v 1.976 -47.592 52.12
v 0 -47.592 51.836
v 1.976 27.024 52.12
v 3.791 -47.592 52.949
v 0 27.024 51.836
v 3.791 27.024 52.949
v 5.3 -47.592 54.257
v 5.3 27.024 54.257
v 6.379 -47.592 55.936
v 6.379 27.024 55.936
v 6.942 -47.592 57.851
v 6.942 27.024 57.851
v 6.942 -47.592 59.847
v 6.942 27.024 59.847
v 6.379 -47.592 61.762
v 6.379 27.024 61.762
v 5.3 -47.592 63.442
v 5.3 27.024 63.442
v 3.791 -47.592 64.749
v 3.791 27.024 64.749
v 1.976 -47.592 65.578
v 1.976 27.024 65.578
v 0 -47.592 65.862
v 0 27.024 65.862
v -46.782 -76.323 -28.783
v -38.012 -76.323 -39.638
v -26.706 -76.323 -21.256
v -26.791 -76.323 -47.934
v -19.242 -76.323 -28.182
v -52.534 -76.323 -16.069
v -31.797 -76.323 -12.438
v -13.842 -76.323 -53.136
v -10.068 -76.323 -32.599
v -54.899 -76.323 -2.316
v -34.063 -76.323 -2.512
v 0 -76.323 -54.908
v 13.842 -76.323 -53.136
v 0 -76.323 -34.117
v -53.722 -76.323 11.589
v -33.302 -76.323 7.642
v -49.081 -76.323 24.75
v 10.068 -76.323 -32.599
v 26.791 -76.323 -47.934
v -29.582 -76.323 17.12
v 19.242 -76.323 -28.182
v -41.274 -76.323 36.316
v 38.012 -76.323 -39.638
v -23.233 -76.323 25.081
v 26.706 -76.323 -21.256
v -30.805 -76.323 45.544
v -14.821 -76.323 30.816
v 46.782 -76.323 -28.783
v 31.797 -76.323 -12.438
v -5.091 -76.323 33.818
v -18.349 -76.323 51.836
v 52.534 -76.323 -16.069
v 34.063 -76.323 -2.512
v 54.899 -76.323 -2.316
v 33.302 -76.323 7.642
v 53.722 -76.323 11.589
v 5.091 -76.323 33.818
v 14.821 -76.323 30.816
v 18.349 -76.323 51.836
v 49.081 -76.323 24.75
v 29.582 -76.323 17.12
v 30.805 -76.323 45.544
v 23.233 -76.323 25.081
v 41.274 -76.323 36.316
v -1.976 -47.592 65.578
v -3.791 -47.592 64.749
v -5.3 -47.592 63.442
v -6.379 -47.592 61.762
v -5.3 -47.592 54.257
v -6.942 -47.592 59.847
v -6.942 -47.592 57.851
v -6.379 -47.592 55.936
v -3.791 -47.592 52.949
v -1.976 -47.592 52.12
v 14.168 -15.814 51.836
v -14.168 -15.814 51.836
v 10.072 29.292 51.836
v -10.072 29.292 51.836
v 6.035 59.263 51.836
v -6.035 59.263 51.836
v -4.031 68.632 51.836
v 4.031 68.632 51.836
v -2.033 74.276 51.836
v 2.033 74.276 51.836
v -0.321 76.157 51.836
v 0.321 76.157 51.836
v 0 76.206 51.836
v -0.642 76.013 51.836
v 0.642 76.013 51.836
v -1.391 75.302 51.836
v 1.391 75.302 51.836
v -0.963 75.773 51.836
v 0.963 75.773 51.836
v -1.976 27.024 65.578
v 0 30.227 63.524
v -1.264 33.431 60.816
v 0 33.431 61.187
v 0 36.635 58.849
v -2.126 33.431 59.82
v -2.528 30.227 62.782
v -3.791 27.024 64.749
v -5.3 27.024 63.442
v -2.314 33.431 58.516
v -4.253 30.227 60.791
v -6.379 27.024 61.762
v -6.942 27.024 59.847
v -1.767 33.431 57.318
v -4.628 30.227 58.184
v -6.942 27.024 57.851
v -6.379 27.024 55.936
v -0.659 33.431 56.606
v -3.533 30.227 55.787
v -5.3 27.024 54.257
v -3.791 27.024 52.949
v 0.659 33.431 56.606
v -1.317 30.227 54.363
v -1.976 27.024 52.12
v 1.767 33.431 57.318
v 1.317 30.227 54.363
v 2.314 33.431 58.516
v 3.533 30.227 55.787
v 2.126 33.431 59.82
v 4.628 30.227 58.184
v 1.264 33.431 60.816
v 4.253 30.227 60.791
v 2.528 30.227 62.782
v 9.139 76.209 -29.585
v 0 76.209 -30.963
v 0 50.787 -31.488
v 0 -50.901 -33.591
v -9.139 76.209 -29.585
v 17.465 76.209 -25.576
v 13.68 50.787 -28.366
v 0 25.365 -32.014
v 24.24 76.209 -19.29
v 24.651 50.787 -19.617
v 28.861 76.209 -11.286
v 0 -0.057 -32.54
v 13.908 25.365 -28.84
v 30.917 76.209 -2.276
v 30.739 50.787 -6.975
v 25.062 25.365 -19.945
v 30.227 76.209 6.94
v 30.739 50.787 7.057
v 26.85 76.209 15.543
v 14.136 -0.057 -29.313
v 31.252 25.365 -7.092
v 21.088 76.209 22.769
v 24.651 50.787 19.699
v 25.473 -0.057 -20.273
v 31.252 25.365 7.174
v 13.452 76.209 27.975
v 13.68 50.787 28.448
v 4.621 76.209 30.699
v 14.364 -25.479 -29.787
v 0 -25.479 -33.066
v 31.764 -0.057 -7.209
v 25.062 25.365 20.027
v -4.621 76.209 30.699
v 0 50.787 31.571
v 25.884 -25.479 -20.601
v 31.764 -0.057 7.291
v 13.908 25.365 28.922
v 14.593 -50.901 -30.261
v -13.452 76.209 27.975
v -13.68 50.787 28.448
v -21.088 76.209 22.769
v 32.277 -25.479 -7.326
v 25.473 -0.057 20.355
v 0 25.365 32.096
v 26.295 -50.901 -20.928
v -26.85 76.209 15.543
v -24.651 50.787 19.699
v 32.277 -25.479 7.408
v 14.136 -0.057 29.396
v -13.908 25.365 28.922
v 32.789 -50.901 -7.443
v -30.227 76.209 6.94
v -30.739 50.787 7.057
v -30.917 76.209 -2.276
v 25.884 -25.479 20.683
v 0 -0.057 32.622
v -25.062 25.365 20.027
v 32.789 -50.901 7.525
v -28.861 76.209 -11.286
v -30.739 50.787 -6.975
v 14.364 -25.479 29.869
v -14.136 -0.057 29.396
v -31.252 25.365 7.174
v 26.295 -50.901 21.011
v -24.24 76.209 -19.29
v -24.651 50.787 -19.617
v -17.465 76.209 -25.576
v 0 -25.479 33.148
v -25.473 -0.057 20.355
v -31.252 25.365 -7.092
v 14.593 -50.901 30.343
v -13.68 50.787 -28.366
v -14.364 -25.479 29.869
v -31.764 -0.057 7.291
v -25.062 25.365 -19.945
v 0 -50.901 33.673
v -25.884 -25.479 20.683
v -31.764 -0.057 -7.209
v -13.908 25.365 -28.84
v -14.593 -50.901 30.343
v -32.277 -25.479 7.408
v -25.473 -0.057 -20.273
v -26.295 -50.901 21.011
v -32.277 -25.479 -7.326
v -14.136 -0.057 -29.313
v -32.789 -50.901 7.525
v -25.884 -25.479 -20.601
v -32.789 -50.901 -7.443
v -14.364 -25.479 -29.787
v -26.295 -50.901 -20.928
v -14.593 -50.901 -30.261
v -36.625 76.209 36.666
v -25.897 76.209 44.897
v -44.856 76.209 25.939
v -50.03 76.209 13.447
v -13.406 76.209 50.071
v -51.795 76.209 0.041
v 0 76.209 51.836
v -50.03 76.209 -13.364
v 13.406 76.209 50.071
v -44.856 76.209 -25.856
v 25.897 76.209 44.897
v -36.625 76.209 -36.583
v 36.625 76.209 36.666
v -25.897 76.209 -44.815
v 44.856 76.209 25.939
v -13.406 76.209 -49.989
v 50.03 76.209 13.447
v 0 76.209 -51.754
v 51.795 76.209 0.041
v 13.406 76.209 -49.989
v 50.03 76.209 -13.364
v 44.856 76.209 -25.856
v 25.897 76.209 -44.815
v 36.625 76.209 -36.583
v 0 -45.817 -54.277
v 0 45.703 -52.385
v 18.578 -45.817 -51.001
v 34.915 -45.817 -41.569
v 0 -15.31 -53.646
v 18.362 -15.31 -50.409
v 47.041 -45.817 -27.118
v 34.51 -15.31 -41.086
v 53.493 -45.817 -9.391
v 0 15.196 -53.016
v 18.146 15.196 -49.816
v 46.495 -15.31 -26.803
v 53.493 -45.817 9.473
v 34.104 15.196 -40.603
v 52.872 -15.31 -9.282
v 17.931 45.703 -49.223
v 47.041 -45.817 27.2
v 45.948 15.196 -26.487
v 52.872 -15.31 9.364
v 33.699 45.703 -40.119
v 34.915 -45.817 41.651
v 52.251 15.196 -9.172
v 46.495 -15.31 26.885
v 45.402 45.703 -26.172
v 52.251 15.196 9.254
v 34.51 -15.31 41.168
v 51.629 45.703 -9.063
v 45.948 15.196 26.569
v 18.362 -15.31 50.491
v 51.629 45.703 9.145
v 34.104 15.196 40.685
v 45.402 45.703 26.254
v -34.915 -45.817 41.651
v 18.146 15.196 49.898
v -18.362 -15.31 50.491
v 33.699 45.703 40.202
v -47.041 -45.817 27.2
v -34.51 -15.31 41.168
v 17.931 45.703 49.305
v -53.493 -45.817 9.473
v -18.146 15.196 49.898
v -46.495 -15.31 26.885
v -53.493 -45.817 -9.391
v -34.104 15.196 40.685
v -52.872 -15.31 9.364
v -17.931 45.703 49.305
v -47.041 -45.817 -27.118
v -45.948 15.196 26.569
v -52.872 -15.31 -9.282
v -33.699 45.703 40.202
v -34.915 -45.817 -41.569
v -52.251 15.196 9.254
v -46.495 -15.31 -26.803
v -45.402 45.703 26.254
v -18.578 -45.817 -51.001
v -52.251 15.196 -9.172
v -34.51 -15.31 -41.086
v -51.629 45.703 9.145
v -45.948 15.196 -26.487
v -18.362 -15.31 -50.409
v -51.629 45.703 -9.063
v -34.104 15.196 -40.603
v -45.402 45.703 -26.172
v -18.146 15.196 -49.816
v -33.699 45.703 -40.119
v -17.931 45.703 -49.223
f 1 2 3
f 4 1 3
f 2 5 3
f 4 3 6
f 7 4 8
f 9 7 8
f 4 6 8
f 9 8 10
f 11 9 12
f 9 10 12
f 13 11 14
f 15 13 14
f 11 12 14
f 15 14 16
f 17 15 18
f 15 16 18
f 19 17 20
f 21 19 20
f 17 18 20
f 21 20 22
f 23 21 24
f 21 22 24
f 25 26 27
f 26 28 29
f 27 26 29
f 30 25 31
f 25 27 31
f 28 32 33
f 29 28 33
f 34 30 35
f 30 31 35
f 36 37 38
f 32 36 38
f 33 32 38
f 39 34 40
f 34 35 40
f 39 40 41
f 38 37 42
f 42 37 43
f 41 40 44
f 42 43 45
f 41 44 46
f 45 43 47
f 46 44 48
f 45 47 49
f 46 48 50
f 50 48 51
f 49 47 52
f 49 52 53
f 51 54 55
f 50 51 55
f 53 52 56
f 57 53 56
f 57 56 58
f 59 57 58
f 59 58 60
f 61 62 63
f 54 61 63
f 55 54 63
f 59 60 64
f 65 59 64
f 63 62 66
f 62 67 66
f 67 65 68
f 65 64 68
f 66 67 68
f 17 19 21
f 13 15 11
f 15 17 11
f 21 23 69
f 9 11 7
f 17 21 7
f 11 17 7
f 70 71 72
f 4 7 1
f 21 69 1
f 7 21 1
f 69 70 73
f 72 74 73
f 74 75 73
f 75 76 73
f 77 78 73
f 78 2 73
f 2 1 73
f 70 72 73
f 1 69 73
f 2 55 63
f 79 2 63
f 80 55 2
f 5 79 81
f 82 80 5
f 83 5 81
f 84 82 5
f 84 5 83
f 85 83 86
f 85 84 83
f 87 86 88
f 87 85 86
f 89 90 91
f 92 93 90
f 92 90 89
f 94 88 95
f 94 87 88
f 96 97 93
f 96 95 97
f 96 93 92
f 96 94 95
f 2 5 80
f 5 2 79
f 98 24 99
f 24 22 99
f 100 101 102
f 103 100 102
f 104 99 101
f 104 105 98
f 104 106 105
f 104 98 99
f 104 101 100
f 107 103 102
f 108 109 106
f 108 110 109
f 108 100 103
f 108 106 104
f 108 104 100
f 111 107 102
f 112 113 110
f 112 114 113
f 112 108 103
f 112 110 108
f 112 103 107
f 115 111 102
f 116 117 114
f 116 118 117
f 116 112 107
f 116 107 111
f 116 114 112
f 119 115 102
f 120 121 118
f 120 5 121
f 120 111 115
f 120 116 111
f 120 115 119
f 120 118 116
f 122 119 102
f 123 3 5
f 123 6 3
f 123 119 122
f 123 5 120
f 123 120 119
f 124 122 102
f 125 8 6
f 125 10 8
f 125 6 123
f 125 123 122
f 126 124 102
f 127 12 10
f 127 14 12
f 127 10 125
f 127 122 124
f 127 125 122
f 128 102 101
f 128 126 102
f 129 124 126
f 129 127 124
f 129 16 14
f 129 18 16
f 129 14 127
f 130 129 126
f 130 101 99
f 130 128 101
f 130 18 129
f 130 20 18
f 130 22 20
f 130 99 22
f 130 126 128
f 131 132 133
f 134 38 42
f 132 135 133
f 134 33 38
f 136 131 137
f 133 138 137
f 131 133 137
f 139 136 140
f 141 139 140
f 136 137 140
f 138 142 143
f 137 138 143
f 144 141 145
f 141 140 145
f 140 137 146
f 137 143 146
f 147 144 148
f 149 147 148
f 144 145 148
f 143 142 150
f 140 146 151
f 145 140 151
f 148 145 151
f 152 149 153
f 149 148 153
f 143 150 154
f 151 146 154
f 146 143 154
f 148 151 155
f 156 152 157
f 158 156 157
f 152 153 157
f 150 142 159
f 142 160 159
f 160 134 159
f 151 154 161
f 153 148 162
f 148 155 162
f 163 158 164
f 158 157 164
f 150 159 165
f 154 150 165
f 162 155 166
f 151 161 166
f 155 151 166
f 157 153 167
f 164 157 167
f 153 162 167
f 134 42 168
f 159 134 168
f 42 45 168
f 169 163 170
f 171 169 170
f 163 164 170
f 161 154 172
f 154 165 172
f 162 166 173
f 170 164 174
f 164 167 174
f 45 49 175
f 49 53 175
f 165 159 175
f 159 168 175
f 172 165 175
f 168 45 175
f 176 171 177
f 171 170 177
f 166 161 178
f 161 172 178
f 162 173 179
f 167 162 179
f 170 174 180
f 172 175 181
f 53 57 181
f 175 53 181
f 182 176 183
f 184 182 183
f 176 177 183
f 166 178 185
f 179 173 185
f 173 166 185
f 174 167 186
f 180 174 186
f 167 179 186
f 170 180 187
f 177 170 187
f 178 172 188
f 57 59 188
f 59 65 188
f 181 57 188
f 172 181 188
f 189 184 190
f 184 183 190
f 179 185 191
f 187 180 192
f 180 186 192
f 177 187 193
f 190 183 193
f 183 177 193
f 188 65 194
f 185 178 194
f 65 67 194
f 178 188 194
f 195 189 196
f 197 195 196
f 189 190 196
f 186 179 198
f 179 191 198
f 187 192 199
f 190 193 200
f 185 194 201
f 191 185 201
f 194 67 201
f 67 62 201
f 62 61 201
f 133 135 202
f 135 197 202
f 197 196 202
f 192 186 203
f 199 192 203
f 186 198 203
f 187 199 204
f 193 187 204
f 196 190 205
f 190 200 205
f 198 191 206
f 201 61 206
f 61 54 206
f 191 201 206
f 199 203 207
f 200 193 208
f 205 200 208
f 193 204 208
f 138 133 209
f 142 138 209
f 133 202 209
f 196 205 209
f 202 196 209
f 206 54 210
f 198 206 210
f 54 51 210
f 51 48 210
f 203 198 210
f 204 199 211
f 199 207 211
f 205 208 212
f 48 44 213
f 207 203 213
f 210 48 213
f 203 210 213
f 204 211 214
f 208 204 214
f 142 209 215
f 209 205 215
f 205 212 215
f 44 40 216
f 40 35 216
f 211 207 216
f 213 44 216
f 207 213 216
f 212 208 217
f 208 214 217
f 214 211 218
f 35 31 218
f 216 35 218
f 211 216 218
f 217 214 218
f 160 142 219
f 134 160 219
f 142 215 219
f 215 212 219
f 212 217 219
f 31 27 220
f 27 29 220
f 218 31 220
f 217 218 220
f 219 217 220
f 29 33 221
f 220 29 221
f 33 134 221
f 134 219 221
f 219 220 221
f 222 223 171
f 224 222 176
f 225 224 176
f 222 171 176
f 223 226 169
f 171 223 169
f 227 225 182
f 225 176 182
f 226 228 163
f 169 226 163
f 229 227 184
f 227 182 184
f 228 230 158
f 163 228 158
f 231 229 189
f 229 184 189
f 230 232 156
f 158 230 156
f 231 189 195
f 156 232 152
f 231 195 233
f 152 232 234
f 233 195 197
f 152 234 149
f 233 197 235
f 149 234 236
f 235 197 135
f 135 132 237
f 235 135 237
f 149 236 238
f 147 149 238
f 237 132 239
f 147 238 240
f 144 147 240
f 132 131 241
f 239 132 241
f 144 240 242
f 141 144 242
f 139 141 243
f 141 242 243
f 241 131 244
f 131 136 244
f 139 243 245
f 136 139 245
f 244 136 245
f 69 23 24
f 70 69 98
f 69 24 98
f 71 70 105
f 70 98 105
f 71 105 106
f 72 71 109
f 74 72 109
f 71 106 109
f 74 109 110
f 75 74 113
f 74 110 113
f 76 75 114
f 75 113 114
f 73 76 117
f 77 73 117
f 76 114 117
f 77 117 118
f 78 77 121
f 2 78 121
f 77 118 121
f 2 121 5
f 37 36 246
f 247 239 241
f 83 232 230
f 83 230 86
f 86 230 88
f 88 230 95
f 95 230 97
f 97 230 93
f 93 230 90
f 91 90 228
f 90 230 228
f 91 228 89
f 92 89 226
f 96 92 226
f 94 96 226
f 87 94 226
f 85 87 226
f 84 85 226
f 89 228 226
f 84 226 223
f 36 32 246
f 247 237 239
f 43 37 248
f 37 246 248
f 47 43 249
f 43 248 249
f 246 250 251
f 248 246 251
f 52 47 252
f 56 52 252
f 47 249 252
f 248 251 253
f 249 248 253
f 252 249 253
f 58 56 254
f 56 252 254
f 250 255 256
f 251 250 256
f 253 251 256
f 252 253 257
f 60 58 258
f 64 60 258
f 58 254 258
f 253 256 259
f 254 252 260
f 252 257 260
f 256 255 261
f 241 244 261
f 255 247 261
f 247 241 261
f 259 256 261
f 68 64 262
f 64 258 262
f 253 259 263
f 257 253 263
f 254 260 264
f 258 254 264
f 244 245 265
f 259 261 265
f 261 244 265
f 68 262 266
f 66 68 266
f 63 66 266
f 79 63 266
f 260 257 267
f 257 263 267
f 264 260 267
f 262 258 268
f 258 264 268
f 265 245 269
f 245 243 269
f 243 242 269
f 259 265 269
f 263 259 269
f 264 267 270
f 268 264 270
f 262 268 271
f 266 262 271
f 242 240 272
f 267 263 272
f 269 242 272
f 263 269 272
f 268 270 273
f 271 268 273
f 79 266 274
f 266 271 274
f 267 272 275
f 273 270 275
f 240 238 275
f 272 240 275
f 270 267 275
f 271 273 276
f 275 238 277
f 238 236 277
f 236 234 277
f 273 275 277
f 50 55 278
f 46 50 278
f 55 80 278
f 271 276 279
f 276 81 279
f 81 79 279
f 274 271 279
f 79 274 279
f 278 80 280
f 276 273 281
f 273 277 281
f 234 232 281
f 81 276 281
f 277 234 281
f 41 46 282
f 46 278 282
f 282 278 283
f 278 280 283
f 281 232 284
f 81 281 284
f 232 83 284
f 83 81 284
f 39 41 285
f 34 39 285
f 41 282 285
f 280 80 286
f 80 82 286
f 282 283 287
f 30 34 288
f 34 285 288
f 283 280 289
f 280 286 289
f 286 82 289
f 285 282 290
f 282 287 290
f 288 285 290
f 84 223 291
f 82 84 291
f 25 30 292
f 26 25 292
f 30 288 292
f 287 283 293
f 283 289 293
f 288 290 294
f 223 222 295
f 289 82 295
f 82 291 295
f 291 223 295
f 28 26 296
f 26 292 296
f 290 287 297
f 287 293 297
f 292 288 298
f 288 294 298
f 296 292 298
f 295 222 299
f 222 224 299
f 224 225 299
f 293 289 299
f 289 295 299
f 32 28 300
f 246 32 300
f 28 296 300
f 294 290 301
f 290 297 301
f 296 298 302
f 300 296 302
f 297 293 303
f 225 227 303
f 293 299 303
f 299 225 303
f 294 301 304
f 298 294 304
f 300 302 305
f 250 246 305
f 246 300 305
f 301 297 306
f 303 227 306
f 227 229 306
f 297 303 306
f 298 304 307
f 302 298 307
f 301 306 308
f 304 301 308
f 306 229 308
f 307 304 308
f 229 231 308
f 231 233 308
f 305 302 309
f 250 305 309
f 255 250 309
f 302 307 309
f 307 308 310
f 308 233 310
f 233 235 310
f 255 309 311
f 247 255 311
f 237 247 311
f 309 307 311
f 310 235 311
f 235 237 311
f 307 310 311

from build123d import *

# Parameters (mm, degrees)
F3_DEPTH      = 114.554
F3_DEPTH_BACK = 105.664
F2_W          = 74.6151711792
F2_H          = 7.012957707


with BuildPart() as f1:
    # F0 (on Right) → F1 (revolve)
    with BuildSketch(Plane.YZ):
        Polygon((76.2091353536, -30.9627838433), (-76.3231962919, -34.1170020401), (-76.3231962919, -54.9080483615), (76.2091353536, -51.7538301647), align=None)
    revolve(axis=Axis((0, -26.1712055653, 0.0410750508), (0, -1, 0)))

    # F2 (on Right) → F3 (cut, two sides)
    with BuildSketch(Plane.YZ) as f3_sk:
        Polygon((-77.6447206736, 51.8360547721), (76.2091651559, 51.8360547721), (76.2091651559, 58.8490124792), (36.6350226104, 58.8490124792), (27.0235743374, 58.8490124792), (-47.5915968418, 58.8490124792), (-77.6447206736, 58.8490124792), align=None)
    extrude(amount=-F3_DEPTH, mode=Mode.SUBTRACT)
    extrude(f3_sk.sketch, amount=F3_DEPTH_BACK, mode=Mode.SUBTRACT)

    # F2 (on Right) → F4 (revolve)
    with BuildSketch(Plane.YZ):
        with Locations((-10.2840112522, 62.3554913327)):
            Rectangle(F2_W, F2_H)
    revolve(axis=Axis((0, -0.7177777588, 58.8490124792), (0, -1, 0)))

    # F2 (on Right) → F5 (revolve)
    with BuildSketch(Plane.YZ):
        Polygon((27.0235743374, 58.8490124792), (36.6350226104, 58.8490124792), (27.0235743374, 65.8619701862), align=None)
    revolve(axis=Axis((0, -0.7177777588, 58.8490124792), (0, -1, 0)))


solid = f1.part
